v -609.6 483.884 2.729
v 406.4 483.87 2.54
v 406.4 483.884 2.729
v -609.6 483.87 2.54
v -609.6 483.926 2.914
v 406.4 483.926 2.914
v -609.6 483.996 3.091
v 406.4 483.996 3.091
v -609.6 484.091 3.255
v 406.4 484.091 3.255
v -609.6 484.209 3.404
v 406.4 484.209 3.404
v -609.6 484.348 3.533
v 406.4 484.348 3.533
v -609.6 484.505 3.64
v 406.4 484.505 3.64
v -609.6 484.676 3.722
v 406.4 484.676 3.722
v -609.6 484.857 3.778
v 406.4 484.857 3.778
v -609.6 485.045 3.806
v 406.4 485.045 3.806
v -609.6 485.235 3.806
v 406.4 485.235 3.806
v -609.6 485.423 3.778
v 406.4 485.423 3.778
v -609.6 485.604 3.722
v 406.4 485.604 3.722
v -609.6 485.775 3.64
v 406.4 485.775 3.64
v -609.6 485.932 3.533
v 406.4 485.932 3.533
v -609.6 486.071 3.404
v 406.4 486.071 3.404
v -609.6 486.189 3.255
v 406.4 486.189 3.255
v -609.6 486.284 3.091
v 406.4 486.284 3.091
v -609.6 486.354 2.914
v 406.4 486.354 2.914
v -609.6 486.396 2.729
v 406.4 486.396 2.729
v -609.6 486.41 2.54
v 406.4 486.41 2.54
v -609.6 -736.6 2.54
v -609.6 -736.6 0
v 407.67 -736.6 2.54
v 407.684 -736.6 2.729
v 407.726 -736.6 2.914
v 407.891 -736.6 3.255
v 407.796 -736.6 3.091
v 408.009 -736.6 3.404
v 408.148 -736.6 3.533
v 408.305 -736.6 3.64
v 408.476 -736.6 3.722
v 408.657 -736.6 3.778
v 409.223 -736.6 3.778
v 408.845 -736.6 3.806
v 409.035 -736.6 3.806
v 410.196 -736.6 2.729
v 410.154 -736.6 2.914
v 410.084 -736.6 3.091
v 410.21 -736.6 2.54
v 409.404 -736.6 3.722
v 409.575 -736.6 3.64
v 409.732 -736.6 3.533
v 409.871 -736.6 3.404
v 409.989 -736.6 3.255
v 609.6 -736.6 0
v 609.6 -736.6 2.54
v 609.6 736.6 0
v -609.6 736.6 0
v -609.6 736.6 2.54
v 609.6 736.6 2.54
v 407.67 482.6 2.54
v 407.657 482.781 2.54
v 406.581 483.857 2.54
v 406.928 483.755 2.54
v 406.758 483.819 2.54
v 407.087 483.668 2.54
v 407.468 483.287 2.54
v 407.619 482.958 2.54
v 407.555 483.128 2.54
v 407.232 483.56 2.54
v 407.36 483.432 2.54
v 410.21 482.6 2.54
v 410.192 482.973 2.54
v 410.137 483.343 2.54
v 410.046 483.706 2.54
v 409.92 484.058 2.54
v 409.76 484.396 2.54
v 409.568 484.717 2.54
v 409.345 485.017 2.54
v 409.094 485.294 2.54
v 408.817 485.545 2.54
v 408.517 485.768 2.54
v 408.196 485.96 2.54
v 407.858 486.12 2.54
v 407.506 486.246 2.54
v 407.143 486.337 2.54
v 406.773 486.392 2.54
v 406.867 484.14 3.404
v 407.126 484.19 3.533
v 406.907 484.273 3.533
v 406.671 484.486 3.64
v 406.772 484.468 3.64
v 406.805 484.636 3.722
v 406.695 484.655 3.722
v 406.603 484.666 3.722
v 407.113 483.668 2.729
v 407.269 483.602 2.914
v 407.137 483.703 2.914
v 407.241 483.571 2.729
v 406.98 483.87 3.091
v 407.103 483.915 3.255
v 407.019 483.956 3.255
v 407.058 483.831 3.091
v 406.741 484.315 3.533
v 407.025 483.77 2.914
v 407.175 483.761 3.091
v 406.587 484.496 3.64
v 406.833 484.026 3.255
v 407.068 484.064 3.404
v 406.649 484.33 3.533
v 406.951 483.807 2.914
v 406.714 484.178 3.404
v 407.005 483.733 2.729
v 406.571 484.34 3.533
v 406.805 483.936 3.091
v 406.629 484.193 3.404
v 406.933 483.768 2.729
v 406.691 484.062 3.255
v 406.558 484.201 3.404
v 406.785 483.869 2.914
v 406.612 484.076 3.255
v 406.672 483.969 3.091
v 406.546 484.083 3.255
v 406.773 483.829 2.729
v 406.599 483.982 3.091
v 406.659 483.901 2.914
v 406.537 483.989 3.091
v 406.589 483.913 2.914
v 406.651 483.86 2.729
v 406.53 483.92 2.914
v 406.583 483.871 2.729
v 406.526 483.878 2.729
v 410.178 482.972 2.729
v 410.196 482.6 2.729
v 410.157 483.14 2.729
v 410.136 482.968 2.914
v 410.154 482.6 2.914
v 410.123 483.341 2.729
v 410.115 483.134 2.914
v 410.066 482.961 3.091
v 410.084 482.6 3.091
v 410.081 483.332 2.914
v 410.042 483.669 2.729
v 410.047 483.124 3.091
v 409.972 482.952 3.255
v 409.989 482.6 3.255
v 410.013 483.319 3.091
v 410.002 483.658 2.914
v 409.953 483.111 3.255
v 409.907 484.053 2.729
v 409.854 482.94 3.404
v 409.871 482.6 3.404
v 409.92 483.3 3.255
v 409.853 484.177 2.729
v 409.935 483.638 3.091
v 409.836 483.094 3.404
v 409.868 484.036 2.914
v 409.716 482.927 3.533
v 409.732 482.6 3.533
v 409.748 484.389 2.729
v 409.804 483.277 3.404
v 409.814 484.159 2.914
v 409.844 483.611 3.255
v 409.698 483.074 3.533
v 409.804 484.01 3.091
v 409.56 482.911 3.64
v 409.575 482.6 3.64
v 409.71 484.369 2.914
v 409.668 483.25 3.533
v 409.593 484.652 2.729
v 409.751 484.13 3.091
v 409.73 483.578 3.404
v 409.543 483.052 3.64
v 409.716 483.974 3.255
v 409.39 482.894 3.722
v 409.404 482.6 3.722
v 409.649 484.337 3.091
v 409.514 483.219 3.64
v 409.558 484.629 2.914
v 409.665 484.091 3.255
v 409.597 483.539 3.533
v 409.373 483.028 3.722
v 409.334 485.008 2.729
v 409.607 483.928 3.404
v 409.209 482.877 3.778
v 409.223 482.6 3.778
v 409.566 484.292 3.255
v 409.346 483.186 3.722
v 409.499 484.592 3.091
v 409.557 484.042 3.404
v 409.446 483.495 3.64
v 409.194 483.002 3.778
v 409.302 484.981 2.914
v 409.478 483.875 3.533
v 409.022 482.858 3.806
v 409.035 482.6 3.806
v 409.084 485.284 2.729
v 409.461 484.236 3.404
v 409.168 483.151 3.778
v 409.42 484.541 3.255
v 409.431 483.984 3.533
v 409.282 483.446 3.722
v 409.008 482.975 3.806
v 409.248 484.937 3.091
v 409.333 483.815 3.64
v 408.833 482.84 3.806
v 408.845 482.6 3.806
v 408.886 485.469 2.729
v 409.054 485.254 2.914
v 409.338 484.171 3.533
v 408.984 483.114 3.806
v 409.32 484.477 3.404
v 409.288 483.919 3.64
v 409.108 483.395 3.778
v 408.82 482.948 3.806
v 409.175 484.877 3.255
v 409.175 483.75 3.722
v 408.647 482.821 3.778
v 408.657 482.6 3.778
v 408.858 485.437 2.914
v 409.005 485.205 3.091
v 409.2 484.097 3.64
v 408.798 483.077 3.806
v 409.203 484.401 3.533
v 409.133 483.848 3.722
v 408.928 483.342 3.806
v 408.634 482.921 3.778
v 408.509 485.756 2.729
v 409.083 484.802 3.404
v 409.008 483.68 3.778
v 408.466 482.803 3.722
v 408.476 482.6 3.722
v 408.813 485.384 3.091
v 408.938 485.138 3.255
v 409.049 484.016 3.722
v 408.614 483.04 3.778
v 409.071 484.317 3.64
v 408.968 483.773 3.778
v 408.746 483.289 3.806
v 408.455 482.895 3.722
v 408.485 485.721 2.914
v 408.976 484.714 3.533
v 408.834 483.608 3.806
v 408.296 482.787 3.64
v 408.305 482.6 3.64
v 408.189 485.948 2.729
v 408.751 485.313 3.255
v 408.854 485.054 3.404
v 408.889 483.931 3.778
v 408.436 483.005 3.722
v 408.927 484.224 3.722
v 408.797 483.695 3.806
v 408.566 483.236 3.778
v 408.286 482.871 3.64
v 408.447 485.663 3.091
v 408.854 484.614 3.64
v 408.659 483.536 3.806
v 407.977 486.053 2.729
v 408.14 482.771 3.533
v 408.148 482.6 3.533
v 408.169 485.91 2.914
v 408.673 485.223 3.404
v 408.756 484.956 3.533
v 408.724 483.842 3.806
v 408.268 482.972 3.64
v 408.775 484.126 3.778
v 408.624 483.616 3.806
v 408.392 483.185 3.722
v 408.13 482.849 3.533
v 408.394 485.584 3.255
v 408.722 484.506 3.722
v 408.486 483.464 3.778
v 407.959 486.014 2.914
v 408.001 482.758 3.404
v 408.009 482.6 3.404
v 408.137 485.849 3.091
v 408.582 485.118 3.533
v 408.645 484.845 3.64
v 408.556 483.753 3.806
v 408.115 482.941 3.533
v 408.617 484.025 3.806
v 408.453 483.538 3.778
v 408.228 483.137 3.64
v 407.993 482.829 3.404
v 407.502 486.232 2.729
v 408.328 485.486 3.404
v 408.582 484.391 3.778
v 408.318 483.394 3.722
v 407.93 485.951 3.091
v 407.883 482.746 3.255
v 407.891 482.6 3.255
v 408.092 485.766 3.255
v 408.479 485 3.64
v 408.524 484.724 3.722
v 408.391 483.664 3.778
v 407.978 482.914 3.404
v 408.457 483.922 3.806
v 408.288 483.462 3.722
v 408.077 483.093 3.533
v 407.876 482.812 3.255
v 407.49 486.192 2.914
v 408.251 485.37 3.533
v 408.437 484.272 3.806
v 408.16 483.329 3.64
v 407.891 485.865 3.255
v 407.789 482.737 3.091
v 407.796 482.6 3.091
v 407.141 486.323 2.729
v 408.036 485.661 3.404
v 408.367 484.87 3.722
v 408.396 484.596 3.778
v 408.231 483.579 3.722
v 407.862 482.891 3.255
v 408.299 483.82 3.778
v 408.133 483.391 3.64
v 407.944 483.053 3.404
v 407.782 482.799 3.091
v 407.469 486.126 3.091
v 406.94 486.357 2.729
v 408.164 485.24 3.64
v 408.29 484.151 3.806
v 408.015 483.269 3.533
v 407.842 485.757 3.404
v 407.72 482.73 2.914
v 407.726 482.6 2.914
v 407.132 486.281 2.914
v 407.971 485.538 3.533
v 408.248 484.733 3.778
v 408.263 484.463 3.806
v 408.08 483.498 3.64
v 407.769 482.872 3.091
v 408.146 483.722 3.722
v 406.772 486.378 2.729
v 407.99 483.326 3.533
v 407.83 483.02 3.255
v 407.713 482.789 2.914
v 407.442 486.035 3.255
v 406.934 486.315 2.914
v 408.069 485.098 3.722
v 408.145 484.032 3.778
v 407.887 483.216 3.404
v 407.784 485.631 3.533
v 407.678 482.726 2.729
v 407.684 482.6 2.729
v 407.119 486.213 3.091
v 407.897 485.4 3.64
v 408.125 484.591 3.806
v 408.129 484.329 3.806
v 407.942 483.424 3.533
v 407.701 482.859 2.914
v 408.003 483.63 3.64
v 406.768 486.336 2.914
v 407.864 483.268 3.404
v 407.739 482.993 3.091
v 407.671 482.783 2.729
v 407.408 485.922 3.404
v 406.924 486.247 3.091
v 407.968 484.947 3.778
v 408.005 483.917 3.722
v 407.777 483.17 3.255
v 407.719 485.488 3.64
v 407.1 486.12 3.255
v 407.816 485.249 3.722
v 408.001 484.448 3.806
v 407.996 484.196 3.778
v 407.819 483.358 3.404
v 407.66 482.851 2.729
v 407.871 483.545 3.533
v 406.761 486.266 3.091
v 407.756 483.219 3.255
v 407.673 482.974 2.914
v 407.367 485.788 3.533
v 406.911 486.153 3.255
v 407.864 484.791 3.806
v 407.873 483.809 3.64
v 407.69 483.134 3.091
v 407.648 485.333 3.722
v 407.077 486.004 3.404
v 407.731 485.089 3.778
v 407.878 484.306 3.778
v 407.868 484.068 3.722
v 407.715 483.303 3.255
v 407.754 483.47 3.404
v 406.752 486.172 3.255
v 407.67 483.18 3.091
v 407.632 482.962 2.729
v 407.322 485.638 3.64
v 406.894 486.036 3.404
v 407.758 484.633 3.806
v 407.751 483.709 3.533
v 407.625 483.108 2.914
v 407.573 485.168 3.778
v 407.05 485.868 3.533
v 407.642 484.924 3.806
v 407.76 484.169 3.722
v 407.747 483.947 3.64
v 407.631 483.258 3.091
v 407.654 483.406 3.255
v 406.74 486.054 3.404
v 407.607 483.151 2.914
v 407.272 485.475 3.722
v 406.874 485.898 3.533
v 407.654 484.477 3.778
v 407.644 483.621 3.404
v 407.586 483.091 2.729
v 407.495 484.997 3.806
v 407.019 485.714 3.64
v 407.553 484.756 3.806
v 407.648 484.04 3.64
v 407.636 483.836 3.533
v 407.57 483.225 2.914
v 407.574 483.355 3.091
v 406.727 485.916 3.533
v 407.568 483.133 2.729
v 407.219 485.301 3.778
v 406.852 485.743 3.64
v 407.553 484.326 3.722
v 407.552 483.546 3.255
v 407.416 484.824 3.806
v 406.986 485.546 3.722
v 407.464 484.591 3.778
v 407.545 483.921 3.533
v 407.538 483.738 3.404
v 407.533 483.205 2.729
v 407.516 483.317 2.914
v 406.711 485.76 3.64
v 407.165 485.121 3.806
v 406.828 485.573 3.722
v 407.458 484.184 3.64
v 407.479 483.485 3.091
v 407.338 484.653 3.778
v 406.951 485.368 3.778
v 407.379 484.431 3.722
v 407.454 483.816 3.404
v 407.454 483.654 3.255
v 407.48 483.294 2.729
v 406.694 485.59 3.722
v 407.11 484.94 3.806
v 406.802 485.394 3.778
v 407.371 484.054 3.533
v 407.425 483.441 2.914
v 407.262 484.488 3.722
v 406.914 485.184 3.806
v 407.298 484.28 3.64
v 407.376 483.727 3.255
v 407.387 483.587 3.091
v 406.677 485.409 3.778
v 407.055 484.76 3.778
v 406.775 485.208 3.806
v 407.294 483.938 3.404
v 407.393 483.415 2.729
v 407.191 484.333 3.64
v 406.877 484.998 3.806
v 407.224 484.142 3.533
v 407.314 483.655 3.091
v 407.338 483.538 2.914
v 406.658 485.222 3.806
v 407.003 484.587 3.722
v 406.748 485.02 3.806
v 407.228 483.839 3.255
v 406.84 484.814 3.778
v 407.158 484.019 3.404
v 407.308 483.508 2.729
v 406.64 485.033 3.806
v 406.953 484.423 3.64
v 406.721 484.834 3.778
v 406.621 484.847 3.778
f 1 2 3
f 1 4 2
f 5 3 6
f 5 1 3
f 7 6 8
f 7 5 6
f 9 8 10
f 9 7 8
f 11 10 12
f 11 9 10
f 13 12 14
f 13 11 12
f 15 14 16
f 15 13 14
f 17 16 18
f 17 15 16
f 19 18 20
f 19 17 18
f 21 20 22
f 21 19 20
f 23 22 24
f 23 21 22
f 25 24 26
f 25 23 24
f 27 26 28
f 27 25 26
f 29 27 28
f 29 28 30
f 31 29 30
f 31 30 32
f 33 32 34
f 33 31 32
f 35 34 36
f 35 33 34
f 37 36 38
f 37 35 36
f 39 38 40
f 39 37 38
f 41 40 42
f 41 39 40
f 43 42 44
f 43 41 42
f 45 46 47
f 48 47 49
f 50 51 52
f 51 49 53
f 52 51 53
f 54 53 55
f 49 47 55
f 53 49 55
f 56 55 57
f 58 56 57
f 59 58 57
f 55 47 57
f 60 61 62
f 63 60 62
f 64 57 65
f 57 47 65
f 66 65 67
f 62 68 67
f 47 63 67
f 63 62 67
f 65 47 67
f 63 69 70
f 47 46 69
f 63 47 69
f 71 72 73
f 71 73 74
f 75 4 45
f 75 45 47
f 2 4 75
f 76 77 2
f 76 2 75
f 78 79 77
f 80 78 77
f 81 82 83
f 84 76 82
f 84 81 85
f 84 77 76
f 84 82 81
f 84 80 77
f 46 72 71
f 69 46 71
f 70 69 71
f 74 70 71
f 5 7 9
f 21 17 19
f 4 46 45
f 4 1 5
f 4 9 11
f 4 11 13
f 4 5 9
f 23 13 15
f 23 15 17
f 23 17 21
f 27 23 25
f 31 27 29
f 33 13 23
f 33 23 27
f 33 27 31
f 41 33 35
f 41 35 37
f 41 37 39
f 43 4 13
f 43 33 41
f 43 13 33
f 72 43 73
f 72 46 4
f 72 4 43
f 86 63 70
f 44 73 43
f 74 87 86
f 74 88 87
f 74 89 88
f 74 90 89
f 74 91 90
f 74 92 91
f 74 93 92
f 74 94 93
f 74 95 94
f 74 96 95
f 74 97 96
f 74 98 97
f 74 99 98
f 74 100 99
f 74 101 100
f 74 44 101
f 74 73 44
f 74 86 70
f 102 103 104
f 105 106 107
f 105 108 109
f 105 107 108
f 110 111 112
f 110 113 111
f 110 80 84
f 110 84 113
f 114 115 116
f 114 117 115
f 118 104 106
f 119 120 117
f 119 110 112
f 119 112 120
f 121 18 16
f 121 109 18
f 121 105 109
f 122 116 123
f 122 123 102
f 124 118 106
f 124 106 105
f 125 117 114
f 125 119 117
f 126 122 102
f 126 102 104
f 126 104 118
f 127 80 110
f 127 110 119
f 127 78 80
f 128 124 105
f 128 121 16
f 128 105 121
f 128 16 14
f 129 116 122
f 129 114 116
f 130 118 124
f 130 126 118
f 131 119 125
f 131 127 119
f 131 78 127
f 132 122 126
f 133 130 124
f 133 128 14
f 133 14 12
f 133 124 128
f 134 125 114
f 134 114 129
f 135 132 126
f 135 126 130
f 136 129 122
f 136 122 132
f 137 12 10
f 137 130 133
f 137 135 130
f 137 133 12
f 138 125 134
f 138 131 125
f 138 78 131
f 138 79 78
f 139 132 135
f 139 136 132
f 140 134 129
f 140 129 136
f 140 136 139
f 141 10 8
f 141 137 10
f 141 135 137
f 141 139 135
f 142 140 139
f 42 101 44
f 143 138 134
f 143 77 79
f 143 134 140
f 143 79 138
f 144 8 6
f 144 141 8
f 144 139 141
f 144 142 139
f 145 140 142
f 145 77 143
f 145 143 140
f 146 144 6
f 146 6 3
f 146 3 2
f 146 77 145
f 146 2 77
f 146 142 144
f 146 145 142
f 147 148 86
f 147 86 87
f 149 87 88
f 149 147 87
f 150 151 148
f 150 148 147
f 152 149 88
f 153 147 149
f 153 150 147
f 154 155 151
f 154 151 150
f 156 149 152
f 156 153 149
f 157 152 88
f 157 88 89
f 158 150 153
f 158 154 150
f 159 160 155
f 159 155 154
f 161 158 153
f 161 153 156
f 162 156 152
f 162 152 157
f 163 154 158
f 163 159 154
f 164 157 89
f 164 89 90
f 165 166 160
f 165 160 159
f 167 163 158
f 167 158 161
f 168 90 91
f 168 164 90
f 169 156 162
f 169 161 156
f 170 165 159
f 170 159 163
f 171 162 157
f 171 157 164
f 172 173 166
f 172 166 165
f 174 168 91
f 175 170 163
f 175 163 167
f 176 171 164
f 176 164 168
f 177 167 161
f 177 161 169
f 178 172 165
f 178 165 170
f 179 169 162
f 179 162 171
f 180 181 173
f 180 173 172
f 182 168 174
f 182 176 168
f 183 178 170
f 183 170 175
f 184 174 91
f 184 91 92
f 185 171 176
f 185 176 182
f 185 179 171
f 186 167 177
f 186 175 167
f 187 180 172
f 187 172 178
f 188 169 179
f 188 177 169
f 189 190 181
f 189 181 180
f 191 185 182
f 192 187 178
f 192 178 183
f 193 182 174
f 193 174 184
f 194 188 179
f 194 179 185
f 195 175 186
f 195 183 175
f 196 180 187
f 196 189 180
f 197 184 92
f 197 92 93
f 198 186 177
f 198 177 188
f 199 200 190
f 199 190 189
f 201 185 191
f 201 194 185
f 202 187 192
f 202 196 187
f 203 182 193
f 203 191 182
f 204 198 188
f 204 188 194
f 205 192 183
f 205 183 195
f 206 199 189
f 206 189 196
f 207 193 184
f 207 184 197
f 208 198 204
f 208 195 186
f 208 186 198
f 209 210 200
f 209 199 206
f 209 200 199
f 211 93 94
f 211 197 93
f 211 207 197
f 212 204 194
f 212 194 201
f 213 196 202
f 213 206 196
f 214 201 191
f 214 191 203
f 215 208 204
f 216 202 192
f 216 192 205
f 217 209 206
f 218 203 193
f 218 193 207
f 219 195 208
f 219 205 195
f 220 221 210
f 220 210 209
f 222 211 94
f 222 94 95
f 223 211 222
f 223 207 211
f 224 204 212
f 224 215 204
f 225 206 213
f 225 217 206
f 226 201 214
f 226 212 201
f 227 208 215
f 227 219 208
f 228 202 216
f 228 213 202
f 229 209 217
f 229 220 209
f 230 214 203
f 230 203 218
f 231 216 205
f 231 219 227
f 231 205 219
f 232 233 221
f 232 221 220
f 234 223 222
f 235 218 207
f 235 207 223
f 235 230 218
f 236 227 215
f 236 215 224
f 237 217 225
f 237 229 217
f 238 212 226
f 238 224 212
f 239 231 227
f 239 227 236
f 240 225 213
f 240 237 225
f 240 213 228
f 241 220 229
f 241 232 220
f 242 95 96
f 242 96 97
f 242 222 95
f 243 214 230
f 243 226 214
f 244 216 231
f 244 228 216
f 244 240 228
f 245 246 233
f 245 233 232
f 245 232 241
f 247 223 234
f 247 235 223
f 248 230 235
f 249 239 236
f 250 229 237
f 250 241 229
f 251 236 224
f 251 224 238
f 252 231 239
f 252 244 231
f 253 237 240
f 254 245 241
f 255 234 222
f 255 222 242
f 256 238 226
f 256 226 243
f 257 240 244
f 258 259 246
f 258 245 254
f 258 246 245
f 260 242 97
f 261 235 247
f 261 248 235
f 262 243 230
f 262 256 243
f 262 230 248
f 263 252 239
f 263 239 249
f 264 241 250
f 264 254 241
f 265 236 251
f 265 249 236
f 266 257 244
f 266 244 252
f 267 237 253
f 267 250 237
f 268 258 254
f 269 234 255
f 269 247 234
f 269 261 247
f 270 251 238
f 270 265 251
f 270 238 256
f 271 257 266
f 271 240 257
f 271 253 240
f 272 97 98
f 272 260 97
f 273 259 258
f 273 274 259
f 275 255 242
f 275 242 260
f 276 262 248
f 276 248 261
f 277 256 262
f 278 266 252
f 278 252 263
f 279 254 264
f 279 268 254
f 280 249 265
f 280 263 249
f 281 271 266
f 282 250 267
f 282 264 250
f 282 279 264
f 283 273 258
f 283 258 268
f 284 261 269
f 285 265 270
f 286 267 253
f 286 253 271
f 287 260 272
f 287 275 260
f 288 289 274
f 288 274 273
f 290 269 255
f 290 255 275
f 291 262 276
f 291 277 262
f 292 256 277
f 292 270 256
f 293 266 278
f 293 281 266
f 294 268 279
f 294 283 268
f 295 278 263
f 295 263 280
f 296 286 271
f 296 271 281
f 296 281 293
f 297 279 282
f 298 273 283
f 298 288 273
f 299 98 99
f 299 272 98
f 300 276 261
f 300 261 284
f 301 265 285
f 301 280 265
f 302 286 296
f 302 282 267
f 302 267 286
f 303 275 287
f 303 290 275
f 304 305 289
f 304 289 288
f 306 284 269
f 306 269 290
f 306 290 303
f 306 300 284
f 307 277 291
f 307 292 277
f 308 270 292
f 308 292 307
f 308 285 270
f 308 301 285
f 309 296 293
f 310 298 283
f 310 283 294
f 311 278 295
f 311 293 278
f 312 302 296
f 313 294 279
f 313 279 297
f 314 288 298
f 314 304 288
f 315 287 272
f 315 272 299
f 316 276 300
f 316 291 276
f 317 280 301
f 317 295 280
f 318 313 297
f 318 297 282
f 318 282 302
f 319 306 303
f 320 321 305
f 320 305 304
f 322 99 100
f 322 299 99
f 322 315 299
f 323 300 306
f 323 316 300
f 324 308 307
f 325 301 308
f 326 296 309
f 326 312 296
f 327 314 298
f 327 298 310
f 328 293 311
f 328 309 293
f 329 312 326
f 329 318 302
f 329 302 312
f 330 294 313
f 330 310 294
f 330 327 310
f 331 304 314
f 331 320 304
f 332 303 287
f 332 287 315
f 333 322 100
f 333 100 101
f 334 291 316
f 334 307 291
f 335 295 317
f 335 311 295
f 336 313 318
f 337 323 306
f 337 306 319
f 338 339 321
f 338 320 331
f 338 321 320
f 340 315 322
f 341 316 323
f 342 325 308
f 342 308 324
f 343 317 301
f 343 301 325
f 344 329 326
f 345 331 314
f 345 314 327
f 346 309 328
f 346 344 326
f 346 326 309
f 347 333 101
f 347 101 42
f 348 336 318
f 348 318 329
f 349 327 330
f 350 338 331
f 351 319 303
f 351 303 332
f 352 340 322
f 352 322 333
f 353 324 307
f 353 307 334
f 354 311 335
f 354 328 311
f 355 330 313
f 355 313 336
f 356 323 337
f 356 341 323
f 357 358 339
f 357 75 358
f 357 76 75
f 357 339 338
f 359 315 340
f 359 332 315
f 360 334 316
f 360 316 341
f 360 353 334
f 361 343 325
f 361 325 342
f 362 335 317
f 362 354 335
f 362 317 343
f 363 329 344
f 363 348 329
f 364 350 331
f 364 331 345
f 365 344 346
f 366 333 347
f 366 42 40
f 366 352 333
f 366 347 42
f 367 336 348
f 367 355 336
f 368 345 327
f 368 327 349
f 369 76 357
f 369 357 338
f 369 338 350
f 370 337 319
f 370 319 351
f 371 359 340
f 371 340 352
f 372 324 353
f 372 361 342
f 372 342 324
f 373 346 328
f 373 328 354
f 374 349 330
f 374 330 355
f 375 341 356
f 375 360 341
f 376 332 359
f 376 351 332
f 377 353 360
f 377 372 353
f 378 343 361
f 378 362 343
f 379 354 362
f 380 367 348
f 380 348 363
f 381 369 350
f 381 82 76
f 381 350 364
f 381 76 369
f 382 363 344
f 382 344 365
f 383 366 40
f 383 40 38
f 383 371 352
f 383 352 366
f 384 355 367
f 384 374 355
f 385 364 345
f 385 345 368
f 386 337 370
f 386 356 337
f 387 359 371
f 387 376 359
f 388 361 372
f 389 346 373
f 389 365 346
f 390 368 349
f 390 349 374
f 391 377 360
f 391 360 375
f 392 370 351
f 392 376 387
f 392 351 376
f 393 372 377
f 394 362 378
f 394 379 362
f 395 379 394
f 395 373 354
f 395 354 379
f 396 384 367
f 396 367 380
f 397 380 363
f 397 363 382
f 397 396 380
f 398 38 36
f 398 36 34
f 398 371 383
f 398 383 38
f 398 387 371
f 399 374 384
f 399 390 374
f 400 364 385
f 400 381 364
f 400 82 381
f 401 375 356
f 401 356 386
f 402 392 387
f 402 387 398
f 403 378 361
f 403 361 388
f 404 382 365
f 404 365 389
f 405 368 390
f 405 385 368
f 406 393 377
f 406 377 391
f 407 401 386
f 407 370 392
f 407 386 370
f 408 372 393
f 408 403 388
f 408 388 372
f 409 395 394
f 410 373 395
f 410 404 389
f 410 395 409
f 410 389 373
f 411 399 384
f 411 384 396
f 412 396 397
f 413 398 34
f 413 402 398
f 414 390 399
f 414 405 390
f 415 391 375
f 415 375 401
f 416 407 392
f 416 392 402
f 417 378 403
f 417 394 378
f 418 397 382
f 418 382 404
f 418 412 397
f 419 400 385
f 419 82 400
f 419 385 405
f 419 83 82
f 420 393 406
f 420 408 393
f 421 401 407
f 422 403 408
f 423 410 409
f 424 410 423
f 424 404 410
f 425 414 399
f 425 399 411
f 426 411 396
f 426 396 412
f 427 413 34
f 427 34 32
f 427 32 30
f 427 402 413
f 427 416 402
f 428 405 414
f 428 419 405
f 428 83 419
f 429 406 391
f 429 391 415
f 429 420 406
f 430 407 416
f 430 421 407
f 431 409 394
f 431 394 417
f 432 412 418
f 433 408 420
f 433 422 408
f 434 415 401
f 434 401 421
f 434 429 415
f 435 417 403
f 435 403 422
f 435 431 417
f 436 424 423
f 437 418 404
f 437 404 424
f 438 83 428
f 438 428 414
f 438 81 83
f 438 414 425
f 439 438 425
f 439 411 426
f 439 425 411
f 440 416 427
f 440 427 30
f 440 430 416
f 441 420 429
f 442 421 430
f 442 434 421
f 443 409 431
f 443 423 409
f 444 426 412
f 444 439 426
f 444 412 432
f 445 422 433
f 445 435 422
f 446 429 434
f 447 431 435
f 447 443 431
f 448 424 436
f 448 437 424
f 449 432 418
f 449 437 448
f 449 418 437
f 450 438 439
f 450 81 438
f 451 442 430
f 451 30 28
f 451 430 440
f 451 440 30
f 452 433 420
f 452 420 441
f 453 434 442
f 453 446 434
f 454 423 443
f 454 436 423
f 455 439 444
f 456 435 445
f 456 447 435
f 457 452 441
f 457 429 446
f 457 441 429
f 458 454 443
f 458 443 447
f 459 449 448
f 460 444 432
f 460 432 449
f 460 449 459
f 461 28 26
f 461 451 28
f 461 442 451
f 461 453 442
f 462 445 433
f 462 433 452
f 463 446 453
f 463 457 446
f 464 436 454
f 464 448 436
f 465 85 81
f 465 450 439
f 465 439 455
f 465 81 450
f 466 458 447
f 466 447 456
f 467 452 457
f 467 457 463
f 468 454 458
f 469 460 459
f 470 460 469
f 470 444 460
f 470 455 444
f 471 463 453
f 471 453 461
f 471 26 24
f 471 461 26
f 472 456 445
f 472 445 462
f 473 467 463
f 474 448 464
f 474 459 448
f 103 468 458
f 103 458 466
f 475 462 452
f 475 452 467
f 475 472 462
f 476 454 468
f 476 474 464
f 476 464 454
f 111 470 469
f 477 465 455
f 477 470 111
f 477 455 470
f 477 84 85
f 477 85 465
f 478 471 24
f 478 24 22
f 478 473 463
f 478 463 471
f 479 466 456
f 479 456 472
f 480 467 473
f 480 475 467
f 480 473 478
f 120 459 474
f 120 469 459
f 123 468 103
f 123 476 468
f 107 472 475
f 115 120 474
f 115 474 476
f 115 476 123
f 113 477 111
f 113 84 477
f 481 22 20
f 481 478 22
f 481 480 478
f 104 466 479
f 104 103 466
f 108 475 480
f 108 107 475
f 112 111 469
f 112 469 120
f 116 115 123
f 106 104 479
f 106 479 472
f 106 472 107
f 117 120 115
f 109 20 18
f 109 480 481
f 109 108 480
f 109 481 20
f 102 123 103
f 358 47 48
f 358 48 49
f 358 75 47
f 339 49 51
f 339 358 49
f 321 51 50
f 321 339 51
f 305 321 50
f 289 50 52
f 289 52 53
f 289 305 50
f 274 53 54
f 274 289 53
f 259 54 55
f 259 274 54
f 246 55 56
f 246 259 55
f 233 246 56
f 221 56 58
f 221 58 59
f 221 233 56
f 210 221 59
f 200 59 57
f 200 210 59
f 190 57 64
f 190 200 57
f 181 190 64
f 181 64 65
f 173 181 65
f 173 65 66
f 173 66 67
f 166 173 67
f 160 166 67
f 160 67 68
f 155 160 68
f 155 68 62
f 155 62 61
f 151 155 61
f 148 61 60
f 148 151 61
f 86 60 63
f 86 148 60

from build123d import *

# Parameters (mm, degrees)
SKETCH1_W           = 1219.2
SKETCH1_H           = 1473.2
BOSS_EXTRUDE1_DEPTH = 2.54
SWEEP1_PROFILE_R    = 1.27


with BuildPart() as part:
    # Sketch1 → Boss-Extrude1 (new body)
    with BuildSketch(Plane.XY):
        Rectangle(SKETCH1_W, SKETCH1_H)
    extrude(amount=BOSS_EXTRUDE1_DEPTH)

    # Sweep1: sweep along a path in Sketch2
    with BuildLine(Plane.XY.offset(2.54)) as sweep1_path:
        Line((408.94, -736.6), (408.94, 482.6))
        ThreePointArc((408.94, 482.6), (408.196051224, 484.396051224), (406.4, 485.14))
        Line((406.4, 485.14), (-609.6, 485.14))
    # Sweep1 profile (on start of the path) → Sweep1 (sweep)
    with BuildSketch(Plane(origin=(408.94, -736.6, 2.54), x_dir=(0, 0, 1), z_dir=(0, 1, 0))):
        Circle(SWEEP1_PROFILE_R)
    sweep(path=sweep1_path.line)


solid = part.part
